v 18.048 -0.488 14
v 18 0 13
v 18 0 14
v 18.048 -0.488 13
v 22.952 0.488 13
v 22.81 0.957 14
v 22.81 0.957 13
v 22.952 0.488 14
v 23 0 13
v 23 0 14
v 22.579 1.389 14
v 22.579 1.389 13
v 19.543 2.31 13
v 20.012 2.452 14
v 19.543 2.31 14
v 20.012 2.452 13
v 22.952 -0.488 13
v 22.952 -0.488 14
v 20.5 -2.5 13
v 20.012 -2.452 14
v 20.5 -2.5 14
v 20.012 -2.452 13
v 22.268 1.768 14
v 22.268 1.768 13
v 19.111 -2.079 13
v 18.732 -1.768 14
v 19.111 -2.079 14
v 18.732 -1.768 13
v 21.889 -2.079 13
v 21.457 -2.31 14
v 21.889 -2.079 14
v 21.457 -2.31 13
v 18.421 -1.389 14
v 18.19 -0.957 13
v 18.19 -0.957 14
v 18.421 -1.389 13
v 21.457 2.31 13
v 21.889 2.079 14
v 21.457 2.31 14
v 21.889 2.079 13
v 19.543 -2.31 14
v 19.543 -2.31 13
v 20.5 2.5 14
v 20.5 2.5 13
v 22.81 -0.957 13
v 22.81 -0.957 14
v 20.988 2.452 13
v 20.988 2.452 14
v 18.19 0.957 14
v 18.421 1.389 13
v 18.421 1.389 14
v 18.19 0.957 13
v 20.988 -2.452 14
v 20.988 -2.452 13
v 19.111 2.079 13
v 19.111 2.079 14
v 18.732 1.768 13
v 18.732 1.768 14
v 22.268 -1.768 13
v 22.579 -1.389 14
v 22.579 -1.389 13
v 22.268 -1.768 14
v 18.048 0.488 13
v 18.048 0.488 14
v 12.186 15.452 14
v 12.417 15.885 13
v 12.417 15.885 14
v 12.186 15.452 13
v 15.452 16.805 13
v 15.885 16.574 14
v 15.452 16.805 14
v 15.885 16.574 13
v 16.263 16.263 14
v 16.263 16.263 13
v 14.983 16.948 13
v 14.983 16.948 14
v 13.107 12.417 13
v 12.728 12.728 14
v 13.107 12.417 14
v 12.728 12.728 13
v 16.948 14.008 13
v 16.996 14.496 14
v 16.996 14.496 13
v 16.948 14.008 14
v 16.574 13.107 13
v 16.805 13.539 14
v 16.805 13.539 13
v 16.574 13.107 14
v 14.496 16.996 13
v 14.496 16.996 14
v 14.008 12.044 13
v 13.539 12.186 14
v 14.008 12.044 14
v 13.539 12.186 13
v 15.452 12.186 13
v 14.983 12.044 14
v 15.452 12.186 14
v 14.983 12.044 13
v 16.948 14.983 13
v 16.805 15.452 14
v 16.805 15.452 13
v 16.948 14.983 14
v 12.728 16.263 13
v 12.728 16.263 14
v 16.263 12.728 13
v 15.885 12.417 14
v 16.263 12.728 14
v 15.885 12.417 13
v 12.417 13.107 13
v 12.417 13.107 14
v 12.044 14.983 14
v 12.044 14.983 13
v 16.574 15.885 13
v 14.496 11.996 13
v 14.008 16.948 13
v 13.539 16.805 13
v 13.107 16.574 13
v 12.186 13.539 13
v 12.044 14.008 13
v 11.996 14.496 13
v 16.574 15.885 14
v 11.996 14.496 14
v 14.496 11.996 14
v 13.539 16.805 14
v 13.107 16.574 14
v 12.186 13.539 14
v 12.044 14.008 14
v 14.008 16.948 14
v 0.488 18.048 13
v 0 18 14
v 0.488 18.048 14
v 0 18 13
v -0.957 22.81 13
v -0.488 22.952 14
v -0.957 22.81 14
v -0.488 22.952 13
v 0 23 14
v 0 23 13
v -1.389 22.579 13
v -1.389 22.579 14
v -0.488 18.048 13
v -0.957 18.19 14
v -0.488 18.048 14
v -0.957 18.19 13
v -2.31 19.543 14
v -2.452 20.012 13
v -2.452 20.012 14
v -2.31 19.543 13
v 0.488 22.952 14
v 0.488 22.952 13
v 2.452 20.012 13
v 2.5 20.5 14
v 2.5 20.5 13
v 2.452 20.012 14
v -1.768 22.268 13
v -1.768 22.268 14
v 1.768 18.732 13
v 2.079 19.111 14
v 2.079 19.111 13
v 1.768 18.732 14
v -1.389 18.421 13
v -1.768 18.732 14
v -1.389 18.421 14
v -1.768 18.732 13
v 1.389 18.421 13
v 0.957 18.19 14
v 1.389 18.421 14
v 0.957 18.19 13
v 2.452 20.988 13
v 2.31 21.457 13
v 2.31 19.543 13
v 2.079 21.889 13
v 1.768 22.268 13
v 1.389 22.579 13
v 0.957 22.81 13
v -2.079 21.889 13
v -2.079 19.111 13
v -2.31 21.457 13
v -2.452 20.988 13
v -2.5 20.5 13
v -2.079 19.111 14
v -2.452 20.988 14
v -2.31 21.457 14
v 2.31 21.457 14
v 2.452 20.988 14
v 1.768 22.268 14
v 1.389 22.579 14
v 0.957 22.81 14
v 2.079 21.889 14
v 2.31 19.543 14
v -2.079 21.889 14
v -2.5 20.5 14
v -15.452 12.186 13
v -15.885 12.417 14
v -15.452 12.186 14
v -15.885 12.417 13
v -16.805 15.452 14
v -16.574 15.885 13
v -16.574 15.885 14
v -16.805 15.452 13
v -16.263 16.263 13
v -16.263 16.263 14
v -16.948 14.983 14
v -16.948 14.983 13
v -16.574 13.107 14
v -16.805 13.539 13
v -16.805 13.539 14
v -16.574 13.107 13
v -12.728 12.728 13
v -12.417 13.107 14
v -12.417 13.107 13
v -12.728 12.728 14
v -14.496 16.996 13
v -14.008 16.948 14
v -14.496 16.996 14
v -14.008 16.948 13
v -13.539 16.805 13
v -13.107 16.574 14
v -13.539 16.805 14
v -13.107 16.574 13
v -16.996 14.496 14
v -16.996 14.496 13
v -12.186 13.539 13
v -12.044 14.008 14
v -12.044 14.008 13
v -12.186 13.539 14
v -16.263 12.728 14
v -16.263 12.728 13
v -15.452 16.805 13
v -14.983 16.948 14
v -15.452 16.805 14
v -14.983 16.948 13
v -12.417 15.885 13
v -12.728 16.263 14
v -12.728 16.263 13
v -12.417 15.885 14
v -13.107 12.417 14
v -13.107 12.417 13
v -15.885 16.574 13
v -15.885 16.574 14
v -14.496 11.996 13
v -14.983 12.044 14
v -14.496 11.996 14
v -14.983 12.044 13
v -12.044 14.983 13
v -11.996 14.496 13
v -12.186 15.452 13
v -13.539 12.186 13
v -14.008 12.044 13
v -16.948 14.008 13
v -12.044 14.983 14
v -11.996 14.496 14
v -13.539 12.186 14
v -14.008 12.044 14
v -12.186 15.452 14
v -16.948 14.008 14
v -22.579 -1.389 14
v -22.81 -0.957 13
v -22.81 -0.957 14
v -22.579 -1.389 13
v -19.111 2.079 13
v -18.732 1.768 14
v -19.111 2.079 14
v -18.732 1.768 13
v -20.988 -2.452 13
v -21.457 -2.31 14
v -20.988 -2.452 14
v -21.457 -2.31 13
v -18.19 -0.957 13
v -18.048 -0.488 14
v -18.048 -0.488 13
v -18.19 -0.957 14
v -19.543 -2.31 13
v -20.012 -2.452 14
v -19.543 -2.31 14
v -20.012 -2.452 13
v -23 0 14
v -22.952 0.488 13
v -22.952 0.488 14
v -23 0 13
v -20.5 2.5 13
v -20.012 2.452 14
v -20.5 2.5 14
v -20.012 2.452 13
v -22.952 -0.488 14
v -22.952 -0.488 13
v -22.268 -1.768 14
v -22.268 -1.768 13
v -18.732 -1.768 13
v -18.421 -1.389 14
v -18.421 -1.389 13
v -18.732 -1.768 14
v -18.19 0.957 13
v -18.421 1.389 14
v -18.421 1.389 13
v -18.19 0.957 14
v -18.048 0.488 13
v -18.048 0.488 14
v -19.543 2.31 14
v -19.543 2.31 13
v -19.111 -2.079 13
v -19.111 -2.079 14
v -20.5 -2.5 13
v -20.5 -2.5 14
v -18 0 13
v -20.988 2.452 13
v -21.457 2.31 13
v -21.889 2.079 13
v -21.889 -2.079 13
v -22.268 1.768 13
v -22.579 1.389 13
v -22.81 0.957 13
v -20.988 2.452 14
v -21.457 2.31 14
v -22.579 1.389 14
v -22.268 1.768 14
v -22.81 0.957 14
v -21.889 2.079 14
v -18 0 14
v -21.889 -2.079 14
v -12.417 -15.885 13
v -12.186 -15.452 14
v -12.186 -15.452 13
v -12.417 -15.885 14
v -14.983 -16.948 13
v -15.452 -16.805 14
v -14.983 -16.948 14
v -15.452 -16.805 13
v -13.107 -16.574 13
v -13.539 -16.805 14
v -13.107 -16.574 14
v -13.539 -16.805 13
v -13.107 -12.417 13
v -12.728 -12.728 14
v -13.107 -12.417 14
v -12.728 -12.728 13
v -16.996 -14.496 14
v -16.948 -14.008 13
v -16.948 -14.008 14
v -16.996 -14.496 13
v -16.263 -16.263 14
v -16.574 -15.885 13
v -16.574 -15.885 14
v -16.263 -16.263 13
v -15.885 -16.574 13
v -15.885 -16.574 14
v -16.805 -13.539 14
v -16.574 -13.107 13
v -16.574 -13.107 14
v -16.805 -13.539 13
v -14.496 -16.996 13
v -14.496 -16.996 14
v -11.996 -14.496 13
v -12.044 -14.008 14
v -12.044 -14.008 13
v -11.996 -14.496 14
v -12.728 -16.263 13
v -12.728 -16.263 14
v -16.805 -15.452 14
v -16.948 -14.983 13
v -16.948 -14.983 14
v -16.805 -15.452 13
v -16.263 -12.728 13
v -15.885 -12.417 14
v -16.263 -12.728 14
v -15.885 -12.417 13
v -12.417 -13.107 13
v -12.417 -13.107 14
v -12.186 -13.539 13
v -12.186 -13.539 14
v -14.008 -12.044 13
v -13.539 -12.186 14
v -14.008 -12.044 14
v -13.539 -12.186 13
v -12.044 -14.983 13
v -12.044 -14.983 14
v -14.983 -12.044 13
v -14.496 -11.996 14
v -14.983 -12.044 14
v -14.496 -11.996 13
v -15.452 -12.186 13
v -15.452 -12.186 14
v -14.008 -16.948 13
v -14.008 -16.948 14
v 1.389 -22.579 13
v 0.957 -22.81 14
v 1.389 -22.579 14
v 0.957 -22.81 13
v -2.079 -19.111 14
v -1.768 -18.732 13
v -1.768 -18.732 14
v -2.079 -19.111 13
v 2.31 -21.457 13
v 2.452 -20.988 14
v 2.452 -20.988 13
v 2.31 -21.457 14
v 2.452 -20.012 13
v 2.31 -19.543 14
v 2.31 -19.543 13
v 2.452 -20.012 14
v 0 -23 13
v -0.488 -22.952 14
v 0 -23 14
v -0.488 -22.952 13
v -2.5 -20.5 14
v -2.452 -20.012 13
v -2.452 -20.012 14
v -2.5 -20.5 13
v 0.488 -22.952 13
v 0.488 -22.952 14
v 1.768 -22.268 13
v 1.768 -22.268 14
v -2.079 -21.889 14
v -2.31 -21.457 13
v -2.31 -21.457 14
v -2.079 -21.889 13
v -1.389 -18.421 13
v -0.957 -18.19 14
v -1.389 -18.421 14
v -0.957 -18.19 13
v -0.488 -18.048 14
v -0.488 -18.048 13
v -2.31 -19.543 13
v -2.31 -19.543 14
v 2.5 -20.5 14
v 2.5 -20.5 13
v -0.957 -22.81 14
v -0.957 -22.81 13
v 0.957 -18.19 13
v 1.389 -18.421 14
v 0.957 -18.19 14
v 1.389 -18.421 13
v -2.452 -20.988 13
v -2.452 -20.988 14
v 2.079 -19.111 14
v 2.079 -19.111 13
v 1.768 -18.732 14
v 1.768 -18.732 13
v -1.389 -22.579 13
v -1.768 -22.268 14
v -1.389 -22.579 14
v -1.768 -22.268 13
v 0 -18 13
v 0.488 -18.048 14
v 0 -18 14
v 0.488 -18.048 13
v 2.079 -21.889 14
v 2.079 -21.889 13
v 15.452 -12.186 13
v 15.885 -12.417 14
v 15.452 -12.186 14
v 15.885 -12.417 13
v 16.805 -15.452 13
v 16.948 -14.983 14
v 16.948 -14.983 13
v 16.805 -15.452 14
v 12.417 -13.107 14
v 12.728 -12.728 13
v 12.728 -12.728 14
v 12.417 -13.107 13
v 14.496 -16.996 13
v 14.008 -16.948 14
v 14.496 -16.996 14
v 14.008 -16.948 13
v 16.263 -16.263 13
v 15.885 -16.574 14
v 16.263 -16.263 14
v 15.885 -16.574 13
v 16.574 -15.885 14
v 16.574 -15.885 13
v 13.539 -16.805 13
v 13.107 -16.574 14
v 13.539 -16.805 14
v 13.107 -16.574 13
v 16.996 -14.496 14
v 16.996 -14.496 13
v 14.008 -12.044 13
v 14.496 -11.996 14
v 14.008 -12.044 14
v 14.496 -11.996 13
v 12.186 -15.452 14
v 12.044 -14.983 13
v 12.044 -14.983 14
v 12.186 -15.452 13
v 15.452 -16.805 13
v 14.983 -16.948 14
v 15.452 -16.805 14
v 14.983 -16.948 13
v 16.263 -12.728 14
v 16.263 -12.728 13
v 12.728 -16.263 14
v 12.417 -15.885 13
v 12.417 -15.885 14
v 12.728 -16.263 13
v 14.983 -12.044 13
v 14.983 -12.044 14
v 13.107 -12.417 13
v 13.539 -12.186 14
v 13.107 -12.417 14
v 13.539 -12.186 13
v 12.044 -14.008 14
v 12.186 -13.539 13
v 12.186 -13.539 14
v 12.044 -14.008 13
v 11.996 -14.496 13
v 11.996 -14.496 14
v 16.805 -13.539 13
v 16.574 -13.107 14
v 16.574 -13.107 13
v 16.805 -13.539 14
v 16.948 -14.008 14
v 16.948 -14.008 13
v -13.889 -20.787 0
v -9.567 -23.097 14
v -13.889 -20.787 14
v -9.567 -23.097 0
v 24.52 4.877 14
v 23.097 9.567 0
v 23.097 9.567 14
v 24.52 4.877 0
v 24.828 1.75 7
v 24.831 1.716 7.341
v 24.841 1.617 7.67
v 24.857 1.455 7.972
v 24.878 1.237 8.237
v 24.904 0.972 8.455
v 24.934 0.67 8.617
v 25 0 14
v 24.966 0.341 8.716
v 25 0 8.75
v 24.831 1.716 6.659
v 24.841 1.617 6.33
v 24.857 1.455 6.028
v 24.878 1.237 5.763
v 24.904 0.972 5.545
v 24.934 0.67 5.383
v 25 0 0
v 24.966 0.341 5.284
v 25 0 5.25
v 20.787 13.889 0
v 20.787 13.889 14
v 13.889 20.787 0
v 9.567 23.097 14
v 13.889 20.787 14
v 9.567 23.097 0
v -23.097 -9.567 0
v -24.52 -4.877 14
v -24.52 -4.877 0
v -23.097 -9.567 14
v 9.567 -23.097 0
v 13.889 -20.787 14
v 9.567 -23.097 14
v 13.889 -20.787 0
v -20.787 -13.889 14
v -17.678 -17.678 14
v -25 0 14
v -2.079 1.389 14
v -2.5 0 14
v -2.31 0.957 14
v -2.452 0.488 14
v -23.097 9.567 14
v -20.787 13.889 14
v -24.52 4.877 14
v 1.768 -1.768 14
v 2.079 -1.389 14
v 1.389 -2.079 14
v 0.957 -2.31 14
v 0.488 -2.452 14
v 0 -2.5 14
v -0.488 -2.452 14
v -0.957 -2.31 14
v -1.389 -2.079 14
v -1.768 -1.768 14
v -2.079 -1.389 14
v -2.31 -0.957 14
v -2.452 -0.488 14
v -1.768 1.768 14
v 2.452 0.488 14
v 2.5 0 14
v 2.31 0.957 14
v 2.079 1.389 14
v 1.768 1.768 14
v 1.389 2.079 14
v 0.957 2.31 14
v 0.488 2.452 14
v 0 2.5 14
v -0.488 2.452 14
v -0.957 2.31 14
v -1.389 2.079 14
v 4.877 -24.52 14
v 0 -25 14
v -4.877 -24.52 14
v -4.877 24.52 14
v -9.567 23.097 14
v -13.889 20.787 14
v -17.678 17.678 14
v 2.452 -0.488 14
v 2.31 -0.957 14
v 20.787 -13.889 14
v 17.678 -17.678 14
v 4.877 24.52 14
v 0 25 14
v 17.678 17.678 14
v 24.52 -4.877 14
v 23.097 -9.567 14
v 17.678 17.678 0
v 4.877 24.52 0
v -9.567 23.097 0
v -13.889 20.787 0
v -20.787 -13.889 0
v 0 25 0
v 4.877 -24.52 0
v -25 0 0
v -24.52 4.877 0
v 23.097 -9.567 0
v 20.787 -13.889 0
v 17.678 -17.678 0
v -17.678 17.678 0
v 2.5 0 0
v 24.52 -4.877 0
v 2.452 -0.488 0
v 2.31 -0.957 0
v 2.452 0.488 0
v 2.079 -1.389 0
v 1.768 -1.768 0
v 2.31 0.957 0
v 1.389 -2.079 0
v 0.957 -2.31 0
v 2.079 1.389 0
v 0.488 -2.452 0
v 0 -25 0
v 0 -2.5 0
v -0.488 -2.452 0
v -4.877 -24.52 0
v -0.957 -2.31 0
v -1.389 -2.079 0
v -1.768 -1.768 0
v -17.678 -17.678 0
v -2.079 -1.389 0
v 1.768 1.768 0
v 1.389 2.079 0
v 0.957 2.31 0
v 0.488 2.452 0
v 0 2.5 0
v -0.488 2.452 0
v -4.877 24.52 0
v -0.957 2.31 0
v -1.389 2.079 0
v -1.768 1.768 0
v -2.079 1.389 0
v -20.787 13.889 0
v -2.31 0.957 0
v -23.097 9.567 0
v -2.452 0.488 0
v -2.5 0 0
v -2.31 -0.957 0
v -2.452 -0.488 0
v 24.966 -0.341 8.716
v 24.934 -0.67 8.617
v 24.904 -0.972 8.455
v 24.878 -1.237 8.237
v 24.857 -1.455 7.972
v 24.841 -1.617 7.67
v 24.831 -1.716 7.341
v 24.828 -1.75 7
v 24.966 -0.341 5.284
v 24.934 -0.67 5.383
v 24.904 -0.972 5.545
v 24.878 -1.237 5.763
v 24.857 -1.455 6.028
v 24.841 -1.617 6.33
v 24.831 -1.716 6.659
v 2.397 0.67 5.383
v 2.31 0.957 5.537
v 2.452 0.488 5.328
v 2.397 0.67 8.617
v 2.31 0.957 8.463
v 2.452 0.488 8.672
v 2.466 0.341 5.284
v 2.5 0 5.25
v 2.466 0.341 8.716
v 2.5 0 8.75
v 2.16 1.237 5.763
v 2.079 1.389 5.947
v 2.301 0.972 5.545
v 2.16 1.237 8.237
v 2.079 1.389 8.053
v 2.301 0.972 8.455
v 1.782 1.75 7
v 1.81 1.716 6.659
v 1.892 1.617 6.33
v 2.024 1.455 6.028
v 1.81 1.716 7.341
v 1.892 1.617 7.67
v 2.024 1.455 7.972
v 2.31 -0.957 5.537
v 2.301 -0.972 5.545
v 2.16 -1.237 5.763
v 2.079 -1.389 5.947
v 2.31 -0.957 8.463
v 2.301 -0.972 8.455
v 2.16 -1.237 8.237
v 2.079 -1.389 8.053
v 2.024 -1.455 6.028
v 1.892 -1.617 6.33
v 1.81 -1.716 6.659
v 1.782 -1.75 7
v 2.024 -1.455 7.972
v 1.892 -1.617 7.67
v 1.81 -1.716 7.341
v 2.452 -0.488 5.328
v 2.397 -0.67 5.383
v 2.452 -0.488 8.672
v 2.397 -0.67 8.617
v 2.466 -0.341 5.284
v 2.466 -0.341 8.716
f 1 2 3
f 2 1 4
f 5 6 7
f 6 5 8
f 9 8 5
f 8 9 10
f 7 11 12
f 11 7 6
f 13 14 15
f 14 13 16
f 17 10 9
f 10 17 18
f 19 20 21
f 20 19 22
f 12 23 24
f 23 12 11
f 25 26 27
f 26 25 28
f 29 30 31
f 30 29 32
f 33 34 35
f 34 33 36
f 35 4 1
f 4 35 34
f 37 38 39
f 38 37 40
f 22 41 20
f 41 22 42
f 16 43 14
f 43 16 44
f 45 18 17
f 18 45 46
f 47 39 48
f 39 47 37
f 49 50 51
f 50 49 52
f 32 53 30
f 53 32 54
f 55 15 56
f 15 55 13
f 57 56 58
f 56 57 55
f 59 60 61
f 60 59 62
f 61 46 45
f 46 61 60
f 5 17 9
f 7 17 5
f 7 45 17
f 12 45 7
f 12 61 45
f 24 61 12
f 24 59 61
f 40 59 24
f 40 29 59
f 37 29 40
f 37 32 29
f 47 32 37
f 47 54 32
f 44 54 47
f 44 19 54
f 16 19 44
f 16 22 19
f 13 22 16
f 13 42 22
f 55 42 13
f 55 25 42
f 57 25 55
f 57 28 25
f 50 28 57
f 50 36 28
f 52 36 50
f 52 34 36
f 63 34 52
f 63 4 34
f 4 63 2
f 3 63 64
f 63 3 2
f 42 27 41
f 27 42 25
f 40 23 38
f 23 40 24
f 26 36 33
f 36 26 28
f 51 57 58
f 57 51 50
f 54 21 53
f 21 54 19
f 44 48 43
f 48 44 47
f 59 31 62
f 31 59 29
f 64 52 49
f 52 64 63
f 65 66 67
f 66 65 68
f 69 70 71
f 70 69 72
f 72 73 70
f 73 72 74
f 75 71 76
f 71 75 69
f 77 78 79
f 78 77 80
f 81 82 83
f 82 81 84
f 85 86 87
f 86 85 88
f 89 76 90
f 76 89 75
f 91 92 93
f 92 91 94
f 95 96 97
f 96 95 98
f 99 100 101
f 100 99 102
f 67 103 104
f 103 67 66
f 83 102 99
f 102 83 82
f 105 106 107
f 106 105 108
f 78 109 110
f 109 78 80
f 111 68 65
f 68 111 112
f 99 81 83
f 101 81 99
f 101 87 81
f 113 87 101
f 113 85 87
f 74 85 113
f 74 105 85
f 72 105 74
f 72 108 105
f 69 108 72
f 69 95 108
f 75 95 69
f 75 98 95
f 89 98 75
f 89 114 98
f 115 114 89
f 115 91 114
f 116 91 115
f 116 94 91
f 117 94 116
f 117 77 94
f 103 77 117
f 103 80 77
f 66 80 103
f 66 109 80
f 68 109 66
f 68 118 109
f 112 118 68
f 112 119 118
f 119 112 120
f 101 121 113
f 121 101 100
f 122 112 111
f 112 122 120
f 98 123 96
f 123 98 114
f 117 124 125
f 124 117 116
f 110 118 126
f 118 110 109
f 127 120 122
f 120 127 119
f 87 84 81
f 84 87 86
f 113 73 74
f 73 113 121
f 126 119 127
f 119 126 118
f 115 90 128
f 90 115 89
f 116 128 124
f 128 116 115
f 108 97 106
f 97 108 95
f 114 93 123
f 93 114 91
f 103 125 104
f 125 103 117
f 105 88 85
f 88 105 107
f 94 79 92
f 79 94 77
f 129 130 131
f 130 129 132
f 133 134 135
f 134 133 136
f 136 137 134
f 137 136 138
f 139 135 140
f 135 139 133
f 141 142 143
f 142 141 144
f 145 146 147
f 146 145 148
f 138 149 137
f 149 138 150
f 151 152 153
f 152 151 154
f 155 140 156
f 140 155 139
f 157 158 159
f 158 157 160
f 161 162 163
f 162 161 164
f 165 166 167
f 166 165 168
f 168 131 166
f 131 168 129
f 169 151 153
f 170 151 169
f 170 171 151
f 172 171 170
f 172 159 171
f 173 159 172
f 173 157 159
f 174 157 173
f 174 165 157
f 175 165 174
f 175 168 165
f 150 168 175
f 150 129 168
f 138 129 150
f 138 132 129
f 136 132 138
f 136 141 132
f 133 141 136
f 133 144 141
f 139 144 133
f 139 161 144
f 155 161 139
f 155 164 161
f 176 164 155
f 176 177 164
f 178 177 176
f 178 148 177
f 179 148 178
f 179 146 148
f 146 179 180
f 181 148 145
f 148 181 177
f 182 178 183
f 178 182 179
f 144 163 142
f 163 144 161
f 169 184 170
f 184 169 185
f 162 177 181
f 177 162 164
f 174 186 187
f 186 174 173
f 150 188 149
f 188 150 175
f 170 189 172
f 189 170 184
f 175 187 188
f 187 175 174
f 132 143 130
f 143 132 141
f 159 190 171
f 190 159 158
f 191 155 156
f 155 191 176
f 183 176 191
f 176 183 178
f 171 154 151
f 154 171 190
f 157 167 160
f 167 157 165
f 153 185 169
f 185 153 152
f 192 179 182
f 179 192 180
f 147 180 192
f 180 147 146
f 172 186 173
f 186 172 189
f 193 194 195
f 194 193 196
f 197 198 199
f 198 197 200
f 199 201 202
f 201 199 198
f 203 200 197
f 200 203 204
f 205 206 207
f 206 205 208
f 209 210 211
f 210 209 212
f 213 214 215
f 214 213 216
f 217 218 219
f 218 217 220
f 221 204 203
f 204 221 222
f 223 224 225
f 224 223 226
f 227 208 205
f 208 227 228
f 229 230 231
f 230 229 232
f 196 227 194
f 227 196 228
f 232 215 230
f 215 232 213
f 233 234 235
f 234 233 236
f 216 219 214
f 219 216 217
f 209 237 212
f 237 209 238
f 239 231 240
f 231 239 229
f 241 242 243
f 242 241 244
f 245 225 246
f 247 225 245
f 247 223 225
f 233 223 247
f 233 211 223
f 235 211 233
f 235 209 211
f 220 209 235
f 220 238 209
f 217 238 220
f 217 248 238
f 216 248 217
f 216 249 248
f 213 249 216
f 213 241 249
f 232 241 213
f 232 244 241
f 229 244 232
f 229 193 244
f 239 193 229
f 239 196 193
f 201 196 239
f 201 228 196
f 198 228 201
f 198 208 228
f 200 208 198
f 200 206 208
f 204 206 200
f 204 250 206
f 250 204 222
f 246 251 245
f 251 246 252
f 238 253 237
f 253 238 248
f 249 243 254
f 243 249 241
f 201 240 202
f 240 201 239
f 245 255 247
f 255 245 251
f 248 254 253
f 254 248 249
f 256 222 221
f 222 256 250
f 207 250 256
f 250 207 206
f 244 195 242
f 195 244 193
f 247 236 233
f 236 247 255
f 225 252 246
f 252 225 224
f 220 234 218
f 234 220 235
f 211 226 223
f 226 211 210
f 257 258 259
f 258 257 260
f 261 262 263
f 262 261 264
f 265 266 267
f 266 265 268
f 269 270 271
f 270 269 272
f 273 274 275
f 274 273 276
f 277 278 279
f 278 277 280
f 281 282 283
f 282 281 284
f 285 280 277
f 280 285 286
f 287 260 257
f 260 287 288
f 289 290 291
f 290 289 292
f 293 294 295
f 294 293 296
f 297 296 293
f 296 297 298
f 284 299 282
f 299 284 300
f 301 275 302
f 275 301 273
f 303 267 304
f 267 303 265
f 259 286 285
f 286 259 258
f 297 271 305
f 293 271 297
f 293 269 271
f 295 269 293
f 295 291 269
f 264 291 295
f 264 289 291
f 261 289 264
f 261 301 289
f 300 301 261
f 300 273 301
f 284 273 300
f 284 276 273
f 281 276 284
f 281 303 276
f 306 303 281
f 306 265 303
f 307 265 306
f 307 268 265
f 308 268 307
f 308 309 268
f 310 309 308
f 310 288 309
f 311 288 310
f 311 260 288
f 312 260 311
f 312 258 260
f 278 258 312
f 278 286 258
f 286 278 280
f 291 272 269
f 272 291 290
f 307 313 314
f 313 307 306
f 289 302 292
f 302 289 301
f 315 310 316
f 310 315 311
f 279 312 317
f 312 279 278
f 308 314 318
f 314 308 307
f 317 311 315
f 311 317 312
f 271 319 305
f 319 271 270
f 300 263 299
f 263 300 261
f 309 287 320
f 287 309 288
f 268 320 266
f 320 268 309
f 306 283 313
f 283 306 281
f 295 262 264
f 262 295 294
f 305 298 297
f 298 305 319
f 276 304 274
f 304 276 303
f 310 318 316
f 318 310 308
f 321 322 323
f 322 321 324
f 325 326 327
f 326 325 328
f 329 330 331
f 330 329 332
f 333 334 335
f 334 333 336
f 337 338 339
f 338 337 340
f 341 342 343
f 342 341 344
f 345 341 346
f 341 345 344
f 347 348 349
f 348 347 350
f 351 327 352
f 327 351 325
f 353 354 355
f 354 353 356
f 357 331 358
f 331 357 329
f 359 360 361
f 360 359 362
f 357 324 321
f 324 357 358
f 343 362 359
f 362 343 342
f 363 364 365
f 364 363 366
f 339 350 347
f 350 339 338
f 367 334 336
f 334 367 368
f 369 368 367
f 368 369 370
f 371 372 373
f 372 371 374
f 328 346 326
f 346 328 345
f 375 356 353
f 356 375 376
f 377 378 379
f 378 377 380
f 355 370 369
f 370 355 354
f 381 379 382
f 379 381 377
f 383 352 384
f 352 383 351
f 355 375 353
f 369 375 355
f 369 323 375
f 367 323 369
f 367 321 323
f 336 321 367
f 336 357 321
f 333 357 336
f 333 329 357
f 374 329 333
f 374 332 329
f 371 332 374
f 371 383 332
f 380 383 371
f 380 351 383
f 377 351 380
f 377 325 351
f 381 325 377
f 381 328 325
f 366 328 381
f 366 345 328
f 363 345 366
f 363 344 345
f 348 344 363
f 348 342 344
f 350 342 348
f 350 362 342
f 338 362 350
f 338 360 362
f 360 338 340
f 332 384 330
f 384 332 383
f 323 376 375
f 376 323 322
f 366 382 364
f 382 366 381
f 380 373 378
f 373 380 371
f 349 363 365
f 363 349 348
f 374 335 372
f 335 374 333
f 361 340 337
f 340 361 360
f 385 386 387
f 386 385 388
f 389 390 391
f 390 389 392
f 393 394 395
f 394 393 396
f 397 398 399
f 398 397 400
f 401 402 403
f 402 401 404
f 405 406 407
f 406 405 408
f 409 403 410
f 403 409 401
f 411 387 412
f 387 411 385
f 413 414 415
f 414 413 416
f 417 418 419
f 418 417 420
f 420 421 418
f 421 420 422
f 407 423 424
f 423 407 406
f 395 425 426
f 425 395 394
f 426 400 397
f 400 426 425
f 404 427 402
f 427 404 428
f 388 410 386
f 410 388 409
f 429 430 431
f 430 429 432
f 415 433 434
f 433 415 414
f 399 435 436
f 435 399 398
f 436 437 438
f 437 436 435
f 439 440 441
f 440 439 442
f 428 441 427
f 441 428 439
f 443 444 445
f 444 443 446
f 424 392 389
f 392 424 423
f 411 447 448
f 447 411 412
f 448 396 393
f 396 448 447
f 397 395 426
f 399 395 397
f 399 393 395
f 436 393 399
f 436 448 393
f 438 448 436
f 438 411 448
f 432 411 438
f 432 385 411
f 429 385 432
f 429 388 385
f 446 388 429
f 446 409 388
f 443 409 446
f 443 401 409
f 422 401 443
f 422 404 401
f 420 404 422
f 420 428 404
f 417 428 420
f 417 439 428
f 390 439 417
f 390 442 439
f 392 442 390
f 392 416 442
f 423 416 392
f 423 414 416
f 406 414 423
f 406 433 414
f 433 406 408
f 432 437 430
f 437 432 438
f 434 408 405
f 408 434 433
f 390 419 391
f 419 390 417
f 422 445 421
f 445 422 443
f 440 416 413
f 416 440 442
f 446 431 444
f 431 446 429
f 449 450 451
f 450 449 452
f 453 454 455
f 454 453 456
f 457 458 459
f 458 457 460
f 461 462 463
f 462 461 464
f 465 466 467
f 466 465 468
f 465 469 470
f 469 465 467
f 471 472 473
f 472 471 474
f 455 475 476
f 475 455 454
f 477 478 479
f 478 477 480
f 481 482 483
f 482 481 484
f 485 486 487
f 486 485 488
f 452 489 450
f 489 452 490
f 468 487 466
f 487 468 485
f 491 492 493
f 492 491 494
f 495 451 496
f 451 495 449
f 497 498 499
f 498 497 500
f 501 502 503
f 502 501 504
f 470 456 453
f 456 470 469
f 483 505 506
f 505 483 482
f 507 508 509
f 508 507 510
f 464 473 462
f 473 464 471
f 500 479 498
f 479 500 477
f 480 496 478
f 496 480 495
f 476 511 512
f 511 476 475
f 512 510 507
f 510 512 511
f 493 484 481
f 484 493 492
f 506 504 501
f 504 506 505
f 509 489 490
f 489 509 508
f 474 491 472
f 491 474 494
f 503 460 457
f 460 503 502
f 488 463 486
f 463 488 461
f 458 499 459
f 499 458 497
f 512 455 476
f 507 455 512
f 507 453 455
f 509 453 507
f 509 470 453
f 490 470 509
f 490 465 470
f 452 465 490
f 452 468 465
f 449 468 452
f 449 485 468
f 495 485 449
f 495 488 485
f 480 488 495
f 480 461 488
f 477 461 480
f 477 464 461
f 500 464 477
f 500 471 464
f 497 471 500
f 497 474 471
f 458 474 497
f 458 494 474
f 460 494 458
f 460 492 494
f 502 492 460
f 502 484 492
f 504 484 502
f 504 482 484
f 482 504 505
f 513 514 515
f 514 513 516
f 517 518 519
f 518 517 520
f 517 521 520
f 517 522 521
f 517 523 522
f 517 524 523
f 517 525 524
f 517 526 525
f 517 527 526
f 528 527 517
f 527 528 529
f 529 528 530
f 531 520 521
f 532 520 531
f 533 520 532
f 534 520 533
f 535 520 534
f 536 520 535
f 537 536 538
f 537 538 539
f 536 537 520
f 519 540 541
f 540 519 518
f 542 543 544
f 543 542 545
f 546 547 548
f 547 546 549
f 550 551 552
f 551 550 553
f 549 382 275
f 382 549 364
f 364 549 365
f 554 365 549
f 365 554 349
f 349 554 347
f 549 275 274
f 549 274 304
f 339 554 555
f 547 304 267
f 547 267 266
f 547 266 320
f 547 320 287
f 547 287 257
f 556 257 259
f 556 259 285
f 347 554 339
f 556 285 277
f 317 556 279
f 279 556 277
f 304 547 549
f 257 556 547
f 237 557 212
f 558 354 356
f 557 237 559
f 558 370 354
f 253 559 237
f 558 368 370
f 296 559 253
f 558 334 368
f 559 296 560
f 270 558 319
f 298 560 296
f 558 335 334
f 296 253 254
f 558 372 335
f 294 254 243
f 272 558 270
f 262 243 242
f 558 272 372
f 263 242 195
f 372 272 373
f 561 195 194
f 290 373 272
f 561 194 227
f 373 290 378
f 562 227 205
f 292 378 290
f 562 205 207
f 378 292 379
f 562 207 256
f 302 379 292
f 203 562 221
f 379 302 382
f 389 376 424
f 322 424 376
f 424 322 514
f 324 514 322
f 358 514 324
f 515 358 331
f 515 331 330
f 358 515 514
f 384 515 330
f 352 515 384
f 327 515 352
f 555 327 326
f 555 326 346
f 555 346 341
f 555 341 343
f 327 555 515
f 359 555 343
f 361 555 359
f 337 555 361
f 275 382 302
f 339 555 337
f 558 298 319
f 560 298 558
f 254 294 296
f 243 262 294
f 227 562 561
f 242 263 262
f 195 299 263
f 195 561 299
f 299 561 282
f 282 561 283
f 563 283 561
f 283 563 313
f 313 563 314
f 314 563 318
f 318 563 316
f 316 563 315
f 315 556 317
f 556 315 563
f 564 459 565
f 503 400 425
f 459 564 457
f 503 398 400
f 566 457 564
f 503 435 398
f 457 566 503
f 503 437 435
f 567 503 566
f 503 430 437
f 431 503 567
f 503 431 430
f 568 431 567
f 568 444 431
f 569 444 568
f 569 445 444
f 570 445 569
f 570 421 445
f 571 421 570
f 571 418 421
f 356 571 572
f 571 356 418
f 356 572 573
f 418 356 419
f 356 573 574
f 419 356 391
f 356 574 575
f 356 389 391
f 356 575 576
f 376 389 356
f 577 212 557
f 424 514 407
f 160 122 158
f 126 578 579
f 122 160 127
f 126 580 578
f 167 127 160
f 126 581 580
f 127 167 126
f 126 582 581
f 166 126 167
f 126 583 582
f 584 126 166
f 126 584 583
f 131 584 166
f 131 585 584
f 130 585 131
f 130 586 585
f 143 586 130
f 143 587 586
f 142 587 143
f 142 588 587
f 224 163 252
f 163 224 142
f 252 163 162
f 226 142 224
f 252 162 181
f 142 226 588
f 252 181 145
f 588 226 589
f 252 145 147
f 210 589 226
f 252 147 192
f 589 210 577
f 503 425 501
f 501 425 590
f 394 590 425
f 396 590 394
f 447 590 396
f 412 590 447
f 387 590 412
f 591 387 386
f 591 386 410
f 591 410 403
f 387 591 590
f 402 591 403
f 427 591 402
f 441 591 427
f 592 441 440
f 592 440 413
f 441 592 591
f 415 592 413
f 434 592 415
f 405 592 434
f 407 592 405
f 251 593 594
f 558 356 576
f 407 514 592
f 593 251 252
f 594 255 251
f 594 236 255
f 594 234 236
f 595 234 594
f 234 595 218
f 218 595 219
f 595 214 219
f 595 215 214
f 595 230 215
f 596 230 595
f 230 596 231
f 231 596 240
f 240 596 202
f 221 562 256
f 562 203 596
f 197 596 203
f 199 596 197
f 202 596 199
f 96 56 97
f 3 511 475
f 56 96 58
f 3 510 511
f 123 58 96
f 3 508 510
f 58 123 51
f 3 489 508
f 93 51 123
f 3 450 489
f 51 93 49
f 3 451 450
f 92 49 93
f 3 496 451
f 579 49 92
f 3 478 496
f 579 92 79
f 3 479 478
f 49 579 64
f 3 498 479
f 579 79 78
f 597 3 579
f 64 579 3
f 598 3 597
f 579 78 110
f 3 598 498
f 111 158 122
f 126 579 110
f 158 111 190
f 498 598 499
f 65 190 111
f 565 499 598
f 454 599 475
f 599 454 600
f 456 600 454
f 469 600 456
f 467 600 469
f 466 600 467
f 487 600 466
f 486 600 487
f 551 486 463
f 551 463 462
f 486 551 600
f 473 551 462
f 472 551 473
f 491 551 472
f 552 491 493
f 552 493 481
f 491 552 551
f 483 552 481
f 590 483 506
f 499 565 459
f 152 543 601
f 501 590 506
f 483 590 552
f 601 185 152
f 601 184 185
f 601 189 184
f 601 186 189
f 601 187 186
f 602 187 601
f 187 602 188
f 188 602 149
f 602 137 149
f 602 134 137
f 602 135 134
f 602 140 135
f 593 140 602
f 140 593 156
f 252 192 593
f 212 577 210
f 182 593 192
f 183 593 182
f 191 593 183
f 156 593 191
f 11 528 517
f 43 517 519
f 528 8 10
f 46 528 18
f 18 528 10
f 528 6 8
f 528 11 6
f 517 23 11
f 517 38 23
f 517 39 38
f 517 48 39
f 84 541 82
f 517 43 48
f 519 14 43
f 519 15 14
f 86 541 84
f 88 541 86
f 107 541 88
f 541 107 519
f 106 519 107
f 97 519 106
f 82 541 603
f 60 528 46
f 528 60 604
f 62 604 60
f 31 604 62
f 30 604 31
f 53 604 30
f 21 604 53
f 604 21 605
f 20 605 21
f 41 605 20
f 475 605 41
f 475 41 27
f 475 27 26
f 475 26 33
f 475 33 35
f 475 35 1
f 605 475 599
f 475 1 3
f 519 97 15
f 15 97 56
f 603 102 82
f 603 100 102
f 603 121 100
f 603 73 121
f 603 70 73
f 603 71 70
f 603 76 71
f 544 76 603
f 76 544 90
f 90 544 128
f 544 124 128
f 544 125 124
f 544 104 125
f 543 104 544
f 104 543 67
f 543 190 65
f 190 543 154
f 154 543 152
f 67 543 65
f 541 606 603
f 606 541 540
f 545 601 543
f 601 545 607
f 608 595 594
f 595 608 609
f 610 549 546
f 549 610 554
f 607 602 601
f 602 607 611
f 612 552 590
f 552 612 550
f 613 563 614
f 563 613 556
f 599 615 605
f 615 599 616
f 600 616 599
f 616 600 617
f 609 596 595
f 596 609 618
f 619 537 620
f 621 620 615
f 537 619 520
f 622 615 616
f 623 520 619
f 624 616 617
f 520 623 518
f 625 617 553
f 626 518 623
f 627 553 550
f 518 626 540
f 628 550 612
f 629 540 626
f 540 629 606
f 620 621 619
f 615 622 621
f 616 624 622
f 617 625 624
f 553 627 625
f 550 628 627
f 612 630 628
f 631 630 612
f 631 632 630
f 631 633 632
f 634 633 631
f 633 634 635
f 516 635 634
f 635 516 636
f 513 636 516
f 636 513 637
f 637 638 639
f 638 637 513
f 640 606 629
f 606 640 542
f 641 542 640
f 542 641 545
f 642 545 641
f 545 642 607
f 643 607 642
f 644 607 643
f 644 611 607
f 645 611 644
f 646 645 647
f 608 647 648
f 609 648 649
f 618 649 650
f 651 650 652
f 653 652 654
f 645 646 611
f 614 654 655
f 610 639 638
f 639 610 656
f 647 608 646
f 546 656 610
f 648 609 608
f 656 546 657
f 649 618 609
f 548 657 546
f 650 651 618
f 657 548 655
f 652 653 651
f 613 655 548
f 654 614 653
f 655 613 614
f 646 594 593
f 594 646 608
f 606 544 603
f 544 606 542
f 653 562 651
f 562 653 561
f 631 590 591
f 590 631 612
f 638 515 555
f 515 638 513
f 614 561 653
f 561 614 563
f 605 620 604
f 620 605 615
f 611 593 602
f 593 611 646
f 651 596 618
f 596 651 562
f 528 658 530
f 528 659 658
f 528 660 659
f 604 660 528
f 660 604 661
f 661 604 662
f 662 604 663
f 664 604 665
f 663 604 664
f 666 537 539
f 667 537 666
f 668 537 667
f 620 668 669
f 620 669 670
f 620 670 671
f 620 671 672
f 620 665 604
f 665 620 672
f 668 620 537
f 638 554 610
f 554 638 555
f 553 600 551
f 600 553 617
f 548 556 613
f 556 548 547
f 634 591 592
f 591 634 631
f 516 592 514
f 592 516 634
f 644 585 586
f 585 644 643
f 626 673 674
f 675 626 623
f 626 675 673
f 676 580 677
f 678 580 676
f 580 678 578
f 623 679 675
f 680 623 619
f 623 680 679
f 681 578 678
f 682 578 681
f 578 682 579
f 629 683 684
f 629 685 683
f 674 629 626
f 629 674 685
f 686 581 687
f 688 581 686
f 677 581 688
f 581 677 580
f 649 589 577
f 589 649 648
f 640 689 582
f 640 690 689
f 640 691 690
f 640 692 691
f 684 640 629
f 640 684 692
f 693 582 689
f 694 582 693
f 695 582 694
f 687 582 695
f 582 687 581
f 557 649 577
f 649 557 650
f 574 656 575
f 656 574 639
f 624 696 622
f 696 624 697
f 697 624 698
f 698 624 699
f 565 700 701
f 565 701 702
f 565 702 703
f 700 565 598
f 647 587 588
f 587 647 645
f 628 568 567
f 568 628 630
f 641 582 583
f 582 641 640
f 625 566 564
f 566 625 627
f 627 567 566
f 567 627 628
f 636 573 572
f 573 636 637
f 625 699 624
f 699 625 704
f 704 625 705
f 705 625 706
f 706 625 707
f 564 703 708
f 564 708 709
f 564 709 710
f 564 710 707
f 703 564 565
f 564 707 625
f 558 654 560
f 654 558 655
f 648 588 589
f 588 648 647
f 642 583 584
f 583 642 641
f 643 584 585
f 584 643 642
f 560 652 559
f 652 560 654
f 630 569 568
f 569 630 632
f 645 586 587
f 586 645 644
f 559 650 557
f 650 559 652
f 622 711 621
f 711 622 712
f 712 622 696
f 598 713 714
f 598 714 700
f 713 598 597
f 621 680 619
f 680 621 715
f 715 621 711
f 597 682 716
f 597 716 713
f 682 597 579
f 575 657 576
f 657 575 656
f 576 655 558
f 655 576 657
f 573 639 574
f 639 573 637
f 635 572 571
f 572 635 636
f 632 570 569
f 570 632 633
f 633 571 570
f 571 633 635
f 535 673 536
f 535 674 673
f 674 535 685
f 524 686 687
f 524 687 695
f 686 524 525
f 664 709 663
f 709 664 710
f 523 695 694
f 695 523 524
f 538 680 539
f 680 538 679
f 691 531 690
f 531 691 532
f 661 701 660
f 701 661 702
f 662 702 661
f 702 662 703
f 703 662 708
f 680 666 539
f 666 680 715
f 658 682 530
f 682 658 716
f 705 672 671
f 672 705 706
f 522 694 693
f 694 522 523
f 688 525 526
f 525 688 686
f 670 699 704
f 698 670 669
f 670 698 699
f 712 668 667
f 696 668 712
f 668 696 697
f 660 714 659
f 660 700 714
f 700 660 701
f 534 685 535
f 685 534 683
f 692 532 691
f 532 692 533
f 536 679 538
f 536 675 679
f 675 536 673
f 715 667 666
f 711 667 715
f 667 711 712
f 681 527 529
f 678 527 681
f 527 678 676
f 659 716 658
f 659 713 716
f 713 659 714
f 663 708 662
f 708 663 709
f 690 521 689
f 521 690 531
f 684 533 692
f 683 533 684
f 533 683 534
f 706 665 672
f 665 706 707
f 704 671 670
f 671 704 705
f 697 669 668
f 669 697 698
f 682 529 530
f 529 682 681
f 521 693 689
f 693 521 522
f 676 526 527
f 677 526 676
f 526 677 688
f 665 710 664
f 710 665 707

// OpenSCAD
$fn = 32;

// ----------------------------------------------------------------------
// Control knob: dimpled knob
// ----------------------------------------------------------------------

// --- parameters (mm) ---
dimp_d = 5;               // finger dimple diameter
n_dimp = 8;               // number of dimples
dimp_r = 20.5;            // dimple ring radius
knob_d = 50;              // knob body diameter
knob_h = 14;              // knob body height
bore_d = 5;               // shaft bore diameter
set_d = 3.5;              // set screw bore diameter
fit_tol = 0.05;           // tolerance for press fits, mm
free_tol = 0.3;           // tolerance for clearance fits, mm

dimp_step = 360 / n_dimp;  // dimple angular step

difference() {
  cylinder(h = knob_h, d = knob_d);
  translate([0, 0, -1]) cylinder(h = knob_h + 2, d = bore_d);
  translate([-1, 0, knob_h / 2]) rotate([0, 90, 0])
    cylinder(h = knob_d / 2 + bore_d / 2 + 2, d = set_d);  for (i = [0 : n_dimp - 1])
    rotate([0, 0, i * dimp_step])
      translate([dimp_r, 0, knob_h - 1])
        cylinder(h = 2, d = dimp_d);
}
